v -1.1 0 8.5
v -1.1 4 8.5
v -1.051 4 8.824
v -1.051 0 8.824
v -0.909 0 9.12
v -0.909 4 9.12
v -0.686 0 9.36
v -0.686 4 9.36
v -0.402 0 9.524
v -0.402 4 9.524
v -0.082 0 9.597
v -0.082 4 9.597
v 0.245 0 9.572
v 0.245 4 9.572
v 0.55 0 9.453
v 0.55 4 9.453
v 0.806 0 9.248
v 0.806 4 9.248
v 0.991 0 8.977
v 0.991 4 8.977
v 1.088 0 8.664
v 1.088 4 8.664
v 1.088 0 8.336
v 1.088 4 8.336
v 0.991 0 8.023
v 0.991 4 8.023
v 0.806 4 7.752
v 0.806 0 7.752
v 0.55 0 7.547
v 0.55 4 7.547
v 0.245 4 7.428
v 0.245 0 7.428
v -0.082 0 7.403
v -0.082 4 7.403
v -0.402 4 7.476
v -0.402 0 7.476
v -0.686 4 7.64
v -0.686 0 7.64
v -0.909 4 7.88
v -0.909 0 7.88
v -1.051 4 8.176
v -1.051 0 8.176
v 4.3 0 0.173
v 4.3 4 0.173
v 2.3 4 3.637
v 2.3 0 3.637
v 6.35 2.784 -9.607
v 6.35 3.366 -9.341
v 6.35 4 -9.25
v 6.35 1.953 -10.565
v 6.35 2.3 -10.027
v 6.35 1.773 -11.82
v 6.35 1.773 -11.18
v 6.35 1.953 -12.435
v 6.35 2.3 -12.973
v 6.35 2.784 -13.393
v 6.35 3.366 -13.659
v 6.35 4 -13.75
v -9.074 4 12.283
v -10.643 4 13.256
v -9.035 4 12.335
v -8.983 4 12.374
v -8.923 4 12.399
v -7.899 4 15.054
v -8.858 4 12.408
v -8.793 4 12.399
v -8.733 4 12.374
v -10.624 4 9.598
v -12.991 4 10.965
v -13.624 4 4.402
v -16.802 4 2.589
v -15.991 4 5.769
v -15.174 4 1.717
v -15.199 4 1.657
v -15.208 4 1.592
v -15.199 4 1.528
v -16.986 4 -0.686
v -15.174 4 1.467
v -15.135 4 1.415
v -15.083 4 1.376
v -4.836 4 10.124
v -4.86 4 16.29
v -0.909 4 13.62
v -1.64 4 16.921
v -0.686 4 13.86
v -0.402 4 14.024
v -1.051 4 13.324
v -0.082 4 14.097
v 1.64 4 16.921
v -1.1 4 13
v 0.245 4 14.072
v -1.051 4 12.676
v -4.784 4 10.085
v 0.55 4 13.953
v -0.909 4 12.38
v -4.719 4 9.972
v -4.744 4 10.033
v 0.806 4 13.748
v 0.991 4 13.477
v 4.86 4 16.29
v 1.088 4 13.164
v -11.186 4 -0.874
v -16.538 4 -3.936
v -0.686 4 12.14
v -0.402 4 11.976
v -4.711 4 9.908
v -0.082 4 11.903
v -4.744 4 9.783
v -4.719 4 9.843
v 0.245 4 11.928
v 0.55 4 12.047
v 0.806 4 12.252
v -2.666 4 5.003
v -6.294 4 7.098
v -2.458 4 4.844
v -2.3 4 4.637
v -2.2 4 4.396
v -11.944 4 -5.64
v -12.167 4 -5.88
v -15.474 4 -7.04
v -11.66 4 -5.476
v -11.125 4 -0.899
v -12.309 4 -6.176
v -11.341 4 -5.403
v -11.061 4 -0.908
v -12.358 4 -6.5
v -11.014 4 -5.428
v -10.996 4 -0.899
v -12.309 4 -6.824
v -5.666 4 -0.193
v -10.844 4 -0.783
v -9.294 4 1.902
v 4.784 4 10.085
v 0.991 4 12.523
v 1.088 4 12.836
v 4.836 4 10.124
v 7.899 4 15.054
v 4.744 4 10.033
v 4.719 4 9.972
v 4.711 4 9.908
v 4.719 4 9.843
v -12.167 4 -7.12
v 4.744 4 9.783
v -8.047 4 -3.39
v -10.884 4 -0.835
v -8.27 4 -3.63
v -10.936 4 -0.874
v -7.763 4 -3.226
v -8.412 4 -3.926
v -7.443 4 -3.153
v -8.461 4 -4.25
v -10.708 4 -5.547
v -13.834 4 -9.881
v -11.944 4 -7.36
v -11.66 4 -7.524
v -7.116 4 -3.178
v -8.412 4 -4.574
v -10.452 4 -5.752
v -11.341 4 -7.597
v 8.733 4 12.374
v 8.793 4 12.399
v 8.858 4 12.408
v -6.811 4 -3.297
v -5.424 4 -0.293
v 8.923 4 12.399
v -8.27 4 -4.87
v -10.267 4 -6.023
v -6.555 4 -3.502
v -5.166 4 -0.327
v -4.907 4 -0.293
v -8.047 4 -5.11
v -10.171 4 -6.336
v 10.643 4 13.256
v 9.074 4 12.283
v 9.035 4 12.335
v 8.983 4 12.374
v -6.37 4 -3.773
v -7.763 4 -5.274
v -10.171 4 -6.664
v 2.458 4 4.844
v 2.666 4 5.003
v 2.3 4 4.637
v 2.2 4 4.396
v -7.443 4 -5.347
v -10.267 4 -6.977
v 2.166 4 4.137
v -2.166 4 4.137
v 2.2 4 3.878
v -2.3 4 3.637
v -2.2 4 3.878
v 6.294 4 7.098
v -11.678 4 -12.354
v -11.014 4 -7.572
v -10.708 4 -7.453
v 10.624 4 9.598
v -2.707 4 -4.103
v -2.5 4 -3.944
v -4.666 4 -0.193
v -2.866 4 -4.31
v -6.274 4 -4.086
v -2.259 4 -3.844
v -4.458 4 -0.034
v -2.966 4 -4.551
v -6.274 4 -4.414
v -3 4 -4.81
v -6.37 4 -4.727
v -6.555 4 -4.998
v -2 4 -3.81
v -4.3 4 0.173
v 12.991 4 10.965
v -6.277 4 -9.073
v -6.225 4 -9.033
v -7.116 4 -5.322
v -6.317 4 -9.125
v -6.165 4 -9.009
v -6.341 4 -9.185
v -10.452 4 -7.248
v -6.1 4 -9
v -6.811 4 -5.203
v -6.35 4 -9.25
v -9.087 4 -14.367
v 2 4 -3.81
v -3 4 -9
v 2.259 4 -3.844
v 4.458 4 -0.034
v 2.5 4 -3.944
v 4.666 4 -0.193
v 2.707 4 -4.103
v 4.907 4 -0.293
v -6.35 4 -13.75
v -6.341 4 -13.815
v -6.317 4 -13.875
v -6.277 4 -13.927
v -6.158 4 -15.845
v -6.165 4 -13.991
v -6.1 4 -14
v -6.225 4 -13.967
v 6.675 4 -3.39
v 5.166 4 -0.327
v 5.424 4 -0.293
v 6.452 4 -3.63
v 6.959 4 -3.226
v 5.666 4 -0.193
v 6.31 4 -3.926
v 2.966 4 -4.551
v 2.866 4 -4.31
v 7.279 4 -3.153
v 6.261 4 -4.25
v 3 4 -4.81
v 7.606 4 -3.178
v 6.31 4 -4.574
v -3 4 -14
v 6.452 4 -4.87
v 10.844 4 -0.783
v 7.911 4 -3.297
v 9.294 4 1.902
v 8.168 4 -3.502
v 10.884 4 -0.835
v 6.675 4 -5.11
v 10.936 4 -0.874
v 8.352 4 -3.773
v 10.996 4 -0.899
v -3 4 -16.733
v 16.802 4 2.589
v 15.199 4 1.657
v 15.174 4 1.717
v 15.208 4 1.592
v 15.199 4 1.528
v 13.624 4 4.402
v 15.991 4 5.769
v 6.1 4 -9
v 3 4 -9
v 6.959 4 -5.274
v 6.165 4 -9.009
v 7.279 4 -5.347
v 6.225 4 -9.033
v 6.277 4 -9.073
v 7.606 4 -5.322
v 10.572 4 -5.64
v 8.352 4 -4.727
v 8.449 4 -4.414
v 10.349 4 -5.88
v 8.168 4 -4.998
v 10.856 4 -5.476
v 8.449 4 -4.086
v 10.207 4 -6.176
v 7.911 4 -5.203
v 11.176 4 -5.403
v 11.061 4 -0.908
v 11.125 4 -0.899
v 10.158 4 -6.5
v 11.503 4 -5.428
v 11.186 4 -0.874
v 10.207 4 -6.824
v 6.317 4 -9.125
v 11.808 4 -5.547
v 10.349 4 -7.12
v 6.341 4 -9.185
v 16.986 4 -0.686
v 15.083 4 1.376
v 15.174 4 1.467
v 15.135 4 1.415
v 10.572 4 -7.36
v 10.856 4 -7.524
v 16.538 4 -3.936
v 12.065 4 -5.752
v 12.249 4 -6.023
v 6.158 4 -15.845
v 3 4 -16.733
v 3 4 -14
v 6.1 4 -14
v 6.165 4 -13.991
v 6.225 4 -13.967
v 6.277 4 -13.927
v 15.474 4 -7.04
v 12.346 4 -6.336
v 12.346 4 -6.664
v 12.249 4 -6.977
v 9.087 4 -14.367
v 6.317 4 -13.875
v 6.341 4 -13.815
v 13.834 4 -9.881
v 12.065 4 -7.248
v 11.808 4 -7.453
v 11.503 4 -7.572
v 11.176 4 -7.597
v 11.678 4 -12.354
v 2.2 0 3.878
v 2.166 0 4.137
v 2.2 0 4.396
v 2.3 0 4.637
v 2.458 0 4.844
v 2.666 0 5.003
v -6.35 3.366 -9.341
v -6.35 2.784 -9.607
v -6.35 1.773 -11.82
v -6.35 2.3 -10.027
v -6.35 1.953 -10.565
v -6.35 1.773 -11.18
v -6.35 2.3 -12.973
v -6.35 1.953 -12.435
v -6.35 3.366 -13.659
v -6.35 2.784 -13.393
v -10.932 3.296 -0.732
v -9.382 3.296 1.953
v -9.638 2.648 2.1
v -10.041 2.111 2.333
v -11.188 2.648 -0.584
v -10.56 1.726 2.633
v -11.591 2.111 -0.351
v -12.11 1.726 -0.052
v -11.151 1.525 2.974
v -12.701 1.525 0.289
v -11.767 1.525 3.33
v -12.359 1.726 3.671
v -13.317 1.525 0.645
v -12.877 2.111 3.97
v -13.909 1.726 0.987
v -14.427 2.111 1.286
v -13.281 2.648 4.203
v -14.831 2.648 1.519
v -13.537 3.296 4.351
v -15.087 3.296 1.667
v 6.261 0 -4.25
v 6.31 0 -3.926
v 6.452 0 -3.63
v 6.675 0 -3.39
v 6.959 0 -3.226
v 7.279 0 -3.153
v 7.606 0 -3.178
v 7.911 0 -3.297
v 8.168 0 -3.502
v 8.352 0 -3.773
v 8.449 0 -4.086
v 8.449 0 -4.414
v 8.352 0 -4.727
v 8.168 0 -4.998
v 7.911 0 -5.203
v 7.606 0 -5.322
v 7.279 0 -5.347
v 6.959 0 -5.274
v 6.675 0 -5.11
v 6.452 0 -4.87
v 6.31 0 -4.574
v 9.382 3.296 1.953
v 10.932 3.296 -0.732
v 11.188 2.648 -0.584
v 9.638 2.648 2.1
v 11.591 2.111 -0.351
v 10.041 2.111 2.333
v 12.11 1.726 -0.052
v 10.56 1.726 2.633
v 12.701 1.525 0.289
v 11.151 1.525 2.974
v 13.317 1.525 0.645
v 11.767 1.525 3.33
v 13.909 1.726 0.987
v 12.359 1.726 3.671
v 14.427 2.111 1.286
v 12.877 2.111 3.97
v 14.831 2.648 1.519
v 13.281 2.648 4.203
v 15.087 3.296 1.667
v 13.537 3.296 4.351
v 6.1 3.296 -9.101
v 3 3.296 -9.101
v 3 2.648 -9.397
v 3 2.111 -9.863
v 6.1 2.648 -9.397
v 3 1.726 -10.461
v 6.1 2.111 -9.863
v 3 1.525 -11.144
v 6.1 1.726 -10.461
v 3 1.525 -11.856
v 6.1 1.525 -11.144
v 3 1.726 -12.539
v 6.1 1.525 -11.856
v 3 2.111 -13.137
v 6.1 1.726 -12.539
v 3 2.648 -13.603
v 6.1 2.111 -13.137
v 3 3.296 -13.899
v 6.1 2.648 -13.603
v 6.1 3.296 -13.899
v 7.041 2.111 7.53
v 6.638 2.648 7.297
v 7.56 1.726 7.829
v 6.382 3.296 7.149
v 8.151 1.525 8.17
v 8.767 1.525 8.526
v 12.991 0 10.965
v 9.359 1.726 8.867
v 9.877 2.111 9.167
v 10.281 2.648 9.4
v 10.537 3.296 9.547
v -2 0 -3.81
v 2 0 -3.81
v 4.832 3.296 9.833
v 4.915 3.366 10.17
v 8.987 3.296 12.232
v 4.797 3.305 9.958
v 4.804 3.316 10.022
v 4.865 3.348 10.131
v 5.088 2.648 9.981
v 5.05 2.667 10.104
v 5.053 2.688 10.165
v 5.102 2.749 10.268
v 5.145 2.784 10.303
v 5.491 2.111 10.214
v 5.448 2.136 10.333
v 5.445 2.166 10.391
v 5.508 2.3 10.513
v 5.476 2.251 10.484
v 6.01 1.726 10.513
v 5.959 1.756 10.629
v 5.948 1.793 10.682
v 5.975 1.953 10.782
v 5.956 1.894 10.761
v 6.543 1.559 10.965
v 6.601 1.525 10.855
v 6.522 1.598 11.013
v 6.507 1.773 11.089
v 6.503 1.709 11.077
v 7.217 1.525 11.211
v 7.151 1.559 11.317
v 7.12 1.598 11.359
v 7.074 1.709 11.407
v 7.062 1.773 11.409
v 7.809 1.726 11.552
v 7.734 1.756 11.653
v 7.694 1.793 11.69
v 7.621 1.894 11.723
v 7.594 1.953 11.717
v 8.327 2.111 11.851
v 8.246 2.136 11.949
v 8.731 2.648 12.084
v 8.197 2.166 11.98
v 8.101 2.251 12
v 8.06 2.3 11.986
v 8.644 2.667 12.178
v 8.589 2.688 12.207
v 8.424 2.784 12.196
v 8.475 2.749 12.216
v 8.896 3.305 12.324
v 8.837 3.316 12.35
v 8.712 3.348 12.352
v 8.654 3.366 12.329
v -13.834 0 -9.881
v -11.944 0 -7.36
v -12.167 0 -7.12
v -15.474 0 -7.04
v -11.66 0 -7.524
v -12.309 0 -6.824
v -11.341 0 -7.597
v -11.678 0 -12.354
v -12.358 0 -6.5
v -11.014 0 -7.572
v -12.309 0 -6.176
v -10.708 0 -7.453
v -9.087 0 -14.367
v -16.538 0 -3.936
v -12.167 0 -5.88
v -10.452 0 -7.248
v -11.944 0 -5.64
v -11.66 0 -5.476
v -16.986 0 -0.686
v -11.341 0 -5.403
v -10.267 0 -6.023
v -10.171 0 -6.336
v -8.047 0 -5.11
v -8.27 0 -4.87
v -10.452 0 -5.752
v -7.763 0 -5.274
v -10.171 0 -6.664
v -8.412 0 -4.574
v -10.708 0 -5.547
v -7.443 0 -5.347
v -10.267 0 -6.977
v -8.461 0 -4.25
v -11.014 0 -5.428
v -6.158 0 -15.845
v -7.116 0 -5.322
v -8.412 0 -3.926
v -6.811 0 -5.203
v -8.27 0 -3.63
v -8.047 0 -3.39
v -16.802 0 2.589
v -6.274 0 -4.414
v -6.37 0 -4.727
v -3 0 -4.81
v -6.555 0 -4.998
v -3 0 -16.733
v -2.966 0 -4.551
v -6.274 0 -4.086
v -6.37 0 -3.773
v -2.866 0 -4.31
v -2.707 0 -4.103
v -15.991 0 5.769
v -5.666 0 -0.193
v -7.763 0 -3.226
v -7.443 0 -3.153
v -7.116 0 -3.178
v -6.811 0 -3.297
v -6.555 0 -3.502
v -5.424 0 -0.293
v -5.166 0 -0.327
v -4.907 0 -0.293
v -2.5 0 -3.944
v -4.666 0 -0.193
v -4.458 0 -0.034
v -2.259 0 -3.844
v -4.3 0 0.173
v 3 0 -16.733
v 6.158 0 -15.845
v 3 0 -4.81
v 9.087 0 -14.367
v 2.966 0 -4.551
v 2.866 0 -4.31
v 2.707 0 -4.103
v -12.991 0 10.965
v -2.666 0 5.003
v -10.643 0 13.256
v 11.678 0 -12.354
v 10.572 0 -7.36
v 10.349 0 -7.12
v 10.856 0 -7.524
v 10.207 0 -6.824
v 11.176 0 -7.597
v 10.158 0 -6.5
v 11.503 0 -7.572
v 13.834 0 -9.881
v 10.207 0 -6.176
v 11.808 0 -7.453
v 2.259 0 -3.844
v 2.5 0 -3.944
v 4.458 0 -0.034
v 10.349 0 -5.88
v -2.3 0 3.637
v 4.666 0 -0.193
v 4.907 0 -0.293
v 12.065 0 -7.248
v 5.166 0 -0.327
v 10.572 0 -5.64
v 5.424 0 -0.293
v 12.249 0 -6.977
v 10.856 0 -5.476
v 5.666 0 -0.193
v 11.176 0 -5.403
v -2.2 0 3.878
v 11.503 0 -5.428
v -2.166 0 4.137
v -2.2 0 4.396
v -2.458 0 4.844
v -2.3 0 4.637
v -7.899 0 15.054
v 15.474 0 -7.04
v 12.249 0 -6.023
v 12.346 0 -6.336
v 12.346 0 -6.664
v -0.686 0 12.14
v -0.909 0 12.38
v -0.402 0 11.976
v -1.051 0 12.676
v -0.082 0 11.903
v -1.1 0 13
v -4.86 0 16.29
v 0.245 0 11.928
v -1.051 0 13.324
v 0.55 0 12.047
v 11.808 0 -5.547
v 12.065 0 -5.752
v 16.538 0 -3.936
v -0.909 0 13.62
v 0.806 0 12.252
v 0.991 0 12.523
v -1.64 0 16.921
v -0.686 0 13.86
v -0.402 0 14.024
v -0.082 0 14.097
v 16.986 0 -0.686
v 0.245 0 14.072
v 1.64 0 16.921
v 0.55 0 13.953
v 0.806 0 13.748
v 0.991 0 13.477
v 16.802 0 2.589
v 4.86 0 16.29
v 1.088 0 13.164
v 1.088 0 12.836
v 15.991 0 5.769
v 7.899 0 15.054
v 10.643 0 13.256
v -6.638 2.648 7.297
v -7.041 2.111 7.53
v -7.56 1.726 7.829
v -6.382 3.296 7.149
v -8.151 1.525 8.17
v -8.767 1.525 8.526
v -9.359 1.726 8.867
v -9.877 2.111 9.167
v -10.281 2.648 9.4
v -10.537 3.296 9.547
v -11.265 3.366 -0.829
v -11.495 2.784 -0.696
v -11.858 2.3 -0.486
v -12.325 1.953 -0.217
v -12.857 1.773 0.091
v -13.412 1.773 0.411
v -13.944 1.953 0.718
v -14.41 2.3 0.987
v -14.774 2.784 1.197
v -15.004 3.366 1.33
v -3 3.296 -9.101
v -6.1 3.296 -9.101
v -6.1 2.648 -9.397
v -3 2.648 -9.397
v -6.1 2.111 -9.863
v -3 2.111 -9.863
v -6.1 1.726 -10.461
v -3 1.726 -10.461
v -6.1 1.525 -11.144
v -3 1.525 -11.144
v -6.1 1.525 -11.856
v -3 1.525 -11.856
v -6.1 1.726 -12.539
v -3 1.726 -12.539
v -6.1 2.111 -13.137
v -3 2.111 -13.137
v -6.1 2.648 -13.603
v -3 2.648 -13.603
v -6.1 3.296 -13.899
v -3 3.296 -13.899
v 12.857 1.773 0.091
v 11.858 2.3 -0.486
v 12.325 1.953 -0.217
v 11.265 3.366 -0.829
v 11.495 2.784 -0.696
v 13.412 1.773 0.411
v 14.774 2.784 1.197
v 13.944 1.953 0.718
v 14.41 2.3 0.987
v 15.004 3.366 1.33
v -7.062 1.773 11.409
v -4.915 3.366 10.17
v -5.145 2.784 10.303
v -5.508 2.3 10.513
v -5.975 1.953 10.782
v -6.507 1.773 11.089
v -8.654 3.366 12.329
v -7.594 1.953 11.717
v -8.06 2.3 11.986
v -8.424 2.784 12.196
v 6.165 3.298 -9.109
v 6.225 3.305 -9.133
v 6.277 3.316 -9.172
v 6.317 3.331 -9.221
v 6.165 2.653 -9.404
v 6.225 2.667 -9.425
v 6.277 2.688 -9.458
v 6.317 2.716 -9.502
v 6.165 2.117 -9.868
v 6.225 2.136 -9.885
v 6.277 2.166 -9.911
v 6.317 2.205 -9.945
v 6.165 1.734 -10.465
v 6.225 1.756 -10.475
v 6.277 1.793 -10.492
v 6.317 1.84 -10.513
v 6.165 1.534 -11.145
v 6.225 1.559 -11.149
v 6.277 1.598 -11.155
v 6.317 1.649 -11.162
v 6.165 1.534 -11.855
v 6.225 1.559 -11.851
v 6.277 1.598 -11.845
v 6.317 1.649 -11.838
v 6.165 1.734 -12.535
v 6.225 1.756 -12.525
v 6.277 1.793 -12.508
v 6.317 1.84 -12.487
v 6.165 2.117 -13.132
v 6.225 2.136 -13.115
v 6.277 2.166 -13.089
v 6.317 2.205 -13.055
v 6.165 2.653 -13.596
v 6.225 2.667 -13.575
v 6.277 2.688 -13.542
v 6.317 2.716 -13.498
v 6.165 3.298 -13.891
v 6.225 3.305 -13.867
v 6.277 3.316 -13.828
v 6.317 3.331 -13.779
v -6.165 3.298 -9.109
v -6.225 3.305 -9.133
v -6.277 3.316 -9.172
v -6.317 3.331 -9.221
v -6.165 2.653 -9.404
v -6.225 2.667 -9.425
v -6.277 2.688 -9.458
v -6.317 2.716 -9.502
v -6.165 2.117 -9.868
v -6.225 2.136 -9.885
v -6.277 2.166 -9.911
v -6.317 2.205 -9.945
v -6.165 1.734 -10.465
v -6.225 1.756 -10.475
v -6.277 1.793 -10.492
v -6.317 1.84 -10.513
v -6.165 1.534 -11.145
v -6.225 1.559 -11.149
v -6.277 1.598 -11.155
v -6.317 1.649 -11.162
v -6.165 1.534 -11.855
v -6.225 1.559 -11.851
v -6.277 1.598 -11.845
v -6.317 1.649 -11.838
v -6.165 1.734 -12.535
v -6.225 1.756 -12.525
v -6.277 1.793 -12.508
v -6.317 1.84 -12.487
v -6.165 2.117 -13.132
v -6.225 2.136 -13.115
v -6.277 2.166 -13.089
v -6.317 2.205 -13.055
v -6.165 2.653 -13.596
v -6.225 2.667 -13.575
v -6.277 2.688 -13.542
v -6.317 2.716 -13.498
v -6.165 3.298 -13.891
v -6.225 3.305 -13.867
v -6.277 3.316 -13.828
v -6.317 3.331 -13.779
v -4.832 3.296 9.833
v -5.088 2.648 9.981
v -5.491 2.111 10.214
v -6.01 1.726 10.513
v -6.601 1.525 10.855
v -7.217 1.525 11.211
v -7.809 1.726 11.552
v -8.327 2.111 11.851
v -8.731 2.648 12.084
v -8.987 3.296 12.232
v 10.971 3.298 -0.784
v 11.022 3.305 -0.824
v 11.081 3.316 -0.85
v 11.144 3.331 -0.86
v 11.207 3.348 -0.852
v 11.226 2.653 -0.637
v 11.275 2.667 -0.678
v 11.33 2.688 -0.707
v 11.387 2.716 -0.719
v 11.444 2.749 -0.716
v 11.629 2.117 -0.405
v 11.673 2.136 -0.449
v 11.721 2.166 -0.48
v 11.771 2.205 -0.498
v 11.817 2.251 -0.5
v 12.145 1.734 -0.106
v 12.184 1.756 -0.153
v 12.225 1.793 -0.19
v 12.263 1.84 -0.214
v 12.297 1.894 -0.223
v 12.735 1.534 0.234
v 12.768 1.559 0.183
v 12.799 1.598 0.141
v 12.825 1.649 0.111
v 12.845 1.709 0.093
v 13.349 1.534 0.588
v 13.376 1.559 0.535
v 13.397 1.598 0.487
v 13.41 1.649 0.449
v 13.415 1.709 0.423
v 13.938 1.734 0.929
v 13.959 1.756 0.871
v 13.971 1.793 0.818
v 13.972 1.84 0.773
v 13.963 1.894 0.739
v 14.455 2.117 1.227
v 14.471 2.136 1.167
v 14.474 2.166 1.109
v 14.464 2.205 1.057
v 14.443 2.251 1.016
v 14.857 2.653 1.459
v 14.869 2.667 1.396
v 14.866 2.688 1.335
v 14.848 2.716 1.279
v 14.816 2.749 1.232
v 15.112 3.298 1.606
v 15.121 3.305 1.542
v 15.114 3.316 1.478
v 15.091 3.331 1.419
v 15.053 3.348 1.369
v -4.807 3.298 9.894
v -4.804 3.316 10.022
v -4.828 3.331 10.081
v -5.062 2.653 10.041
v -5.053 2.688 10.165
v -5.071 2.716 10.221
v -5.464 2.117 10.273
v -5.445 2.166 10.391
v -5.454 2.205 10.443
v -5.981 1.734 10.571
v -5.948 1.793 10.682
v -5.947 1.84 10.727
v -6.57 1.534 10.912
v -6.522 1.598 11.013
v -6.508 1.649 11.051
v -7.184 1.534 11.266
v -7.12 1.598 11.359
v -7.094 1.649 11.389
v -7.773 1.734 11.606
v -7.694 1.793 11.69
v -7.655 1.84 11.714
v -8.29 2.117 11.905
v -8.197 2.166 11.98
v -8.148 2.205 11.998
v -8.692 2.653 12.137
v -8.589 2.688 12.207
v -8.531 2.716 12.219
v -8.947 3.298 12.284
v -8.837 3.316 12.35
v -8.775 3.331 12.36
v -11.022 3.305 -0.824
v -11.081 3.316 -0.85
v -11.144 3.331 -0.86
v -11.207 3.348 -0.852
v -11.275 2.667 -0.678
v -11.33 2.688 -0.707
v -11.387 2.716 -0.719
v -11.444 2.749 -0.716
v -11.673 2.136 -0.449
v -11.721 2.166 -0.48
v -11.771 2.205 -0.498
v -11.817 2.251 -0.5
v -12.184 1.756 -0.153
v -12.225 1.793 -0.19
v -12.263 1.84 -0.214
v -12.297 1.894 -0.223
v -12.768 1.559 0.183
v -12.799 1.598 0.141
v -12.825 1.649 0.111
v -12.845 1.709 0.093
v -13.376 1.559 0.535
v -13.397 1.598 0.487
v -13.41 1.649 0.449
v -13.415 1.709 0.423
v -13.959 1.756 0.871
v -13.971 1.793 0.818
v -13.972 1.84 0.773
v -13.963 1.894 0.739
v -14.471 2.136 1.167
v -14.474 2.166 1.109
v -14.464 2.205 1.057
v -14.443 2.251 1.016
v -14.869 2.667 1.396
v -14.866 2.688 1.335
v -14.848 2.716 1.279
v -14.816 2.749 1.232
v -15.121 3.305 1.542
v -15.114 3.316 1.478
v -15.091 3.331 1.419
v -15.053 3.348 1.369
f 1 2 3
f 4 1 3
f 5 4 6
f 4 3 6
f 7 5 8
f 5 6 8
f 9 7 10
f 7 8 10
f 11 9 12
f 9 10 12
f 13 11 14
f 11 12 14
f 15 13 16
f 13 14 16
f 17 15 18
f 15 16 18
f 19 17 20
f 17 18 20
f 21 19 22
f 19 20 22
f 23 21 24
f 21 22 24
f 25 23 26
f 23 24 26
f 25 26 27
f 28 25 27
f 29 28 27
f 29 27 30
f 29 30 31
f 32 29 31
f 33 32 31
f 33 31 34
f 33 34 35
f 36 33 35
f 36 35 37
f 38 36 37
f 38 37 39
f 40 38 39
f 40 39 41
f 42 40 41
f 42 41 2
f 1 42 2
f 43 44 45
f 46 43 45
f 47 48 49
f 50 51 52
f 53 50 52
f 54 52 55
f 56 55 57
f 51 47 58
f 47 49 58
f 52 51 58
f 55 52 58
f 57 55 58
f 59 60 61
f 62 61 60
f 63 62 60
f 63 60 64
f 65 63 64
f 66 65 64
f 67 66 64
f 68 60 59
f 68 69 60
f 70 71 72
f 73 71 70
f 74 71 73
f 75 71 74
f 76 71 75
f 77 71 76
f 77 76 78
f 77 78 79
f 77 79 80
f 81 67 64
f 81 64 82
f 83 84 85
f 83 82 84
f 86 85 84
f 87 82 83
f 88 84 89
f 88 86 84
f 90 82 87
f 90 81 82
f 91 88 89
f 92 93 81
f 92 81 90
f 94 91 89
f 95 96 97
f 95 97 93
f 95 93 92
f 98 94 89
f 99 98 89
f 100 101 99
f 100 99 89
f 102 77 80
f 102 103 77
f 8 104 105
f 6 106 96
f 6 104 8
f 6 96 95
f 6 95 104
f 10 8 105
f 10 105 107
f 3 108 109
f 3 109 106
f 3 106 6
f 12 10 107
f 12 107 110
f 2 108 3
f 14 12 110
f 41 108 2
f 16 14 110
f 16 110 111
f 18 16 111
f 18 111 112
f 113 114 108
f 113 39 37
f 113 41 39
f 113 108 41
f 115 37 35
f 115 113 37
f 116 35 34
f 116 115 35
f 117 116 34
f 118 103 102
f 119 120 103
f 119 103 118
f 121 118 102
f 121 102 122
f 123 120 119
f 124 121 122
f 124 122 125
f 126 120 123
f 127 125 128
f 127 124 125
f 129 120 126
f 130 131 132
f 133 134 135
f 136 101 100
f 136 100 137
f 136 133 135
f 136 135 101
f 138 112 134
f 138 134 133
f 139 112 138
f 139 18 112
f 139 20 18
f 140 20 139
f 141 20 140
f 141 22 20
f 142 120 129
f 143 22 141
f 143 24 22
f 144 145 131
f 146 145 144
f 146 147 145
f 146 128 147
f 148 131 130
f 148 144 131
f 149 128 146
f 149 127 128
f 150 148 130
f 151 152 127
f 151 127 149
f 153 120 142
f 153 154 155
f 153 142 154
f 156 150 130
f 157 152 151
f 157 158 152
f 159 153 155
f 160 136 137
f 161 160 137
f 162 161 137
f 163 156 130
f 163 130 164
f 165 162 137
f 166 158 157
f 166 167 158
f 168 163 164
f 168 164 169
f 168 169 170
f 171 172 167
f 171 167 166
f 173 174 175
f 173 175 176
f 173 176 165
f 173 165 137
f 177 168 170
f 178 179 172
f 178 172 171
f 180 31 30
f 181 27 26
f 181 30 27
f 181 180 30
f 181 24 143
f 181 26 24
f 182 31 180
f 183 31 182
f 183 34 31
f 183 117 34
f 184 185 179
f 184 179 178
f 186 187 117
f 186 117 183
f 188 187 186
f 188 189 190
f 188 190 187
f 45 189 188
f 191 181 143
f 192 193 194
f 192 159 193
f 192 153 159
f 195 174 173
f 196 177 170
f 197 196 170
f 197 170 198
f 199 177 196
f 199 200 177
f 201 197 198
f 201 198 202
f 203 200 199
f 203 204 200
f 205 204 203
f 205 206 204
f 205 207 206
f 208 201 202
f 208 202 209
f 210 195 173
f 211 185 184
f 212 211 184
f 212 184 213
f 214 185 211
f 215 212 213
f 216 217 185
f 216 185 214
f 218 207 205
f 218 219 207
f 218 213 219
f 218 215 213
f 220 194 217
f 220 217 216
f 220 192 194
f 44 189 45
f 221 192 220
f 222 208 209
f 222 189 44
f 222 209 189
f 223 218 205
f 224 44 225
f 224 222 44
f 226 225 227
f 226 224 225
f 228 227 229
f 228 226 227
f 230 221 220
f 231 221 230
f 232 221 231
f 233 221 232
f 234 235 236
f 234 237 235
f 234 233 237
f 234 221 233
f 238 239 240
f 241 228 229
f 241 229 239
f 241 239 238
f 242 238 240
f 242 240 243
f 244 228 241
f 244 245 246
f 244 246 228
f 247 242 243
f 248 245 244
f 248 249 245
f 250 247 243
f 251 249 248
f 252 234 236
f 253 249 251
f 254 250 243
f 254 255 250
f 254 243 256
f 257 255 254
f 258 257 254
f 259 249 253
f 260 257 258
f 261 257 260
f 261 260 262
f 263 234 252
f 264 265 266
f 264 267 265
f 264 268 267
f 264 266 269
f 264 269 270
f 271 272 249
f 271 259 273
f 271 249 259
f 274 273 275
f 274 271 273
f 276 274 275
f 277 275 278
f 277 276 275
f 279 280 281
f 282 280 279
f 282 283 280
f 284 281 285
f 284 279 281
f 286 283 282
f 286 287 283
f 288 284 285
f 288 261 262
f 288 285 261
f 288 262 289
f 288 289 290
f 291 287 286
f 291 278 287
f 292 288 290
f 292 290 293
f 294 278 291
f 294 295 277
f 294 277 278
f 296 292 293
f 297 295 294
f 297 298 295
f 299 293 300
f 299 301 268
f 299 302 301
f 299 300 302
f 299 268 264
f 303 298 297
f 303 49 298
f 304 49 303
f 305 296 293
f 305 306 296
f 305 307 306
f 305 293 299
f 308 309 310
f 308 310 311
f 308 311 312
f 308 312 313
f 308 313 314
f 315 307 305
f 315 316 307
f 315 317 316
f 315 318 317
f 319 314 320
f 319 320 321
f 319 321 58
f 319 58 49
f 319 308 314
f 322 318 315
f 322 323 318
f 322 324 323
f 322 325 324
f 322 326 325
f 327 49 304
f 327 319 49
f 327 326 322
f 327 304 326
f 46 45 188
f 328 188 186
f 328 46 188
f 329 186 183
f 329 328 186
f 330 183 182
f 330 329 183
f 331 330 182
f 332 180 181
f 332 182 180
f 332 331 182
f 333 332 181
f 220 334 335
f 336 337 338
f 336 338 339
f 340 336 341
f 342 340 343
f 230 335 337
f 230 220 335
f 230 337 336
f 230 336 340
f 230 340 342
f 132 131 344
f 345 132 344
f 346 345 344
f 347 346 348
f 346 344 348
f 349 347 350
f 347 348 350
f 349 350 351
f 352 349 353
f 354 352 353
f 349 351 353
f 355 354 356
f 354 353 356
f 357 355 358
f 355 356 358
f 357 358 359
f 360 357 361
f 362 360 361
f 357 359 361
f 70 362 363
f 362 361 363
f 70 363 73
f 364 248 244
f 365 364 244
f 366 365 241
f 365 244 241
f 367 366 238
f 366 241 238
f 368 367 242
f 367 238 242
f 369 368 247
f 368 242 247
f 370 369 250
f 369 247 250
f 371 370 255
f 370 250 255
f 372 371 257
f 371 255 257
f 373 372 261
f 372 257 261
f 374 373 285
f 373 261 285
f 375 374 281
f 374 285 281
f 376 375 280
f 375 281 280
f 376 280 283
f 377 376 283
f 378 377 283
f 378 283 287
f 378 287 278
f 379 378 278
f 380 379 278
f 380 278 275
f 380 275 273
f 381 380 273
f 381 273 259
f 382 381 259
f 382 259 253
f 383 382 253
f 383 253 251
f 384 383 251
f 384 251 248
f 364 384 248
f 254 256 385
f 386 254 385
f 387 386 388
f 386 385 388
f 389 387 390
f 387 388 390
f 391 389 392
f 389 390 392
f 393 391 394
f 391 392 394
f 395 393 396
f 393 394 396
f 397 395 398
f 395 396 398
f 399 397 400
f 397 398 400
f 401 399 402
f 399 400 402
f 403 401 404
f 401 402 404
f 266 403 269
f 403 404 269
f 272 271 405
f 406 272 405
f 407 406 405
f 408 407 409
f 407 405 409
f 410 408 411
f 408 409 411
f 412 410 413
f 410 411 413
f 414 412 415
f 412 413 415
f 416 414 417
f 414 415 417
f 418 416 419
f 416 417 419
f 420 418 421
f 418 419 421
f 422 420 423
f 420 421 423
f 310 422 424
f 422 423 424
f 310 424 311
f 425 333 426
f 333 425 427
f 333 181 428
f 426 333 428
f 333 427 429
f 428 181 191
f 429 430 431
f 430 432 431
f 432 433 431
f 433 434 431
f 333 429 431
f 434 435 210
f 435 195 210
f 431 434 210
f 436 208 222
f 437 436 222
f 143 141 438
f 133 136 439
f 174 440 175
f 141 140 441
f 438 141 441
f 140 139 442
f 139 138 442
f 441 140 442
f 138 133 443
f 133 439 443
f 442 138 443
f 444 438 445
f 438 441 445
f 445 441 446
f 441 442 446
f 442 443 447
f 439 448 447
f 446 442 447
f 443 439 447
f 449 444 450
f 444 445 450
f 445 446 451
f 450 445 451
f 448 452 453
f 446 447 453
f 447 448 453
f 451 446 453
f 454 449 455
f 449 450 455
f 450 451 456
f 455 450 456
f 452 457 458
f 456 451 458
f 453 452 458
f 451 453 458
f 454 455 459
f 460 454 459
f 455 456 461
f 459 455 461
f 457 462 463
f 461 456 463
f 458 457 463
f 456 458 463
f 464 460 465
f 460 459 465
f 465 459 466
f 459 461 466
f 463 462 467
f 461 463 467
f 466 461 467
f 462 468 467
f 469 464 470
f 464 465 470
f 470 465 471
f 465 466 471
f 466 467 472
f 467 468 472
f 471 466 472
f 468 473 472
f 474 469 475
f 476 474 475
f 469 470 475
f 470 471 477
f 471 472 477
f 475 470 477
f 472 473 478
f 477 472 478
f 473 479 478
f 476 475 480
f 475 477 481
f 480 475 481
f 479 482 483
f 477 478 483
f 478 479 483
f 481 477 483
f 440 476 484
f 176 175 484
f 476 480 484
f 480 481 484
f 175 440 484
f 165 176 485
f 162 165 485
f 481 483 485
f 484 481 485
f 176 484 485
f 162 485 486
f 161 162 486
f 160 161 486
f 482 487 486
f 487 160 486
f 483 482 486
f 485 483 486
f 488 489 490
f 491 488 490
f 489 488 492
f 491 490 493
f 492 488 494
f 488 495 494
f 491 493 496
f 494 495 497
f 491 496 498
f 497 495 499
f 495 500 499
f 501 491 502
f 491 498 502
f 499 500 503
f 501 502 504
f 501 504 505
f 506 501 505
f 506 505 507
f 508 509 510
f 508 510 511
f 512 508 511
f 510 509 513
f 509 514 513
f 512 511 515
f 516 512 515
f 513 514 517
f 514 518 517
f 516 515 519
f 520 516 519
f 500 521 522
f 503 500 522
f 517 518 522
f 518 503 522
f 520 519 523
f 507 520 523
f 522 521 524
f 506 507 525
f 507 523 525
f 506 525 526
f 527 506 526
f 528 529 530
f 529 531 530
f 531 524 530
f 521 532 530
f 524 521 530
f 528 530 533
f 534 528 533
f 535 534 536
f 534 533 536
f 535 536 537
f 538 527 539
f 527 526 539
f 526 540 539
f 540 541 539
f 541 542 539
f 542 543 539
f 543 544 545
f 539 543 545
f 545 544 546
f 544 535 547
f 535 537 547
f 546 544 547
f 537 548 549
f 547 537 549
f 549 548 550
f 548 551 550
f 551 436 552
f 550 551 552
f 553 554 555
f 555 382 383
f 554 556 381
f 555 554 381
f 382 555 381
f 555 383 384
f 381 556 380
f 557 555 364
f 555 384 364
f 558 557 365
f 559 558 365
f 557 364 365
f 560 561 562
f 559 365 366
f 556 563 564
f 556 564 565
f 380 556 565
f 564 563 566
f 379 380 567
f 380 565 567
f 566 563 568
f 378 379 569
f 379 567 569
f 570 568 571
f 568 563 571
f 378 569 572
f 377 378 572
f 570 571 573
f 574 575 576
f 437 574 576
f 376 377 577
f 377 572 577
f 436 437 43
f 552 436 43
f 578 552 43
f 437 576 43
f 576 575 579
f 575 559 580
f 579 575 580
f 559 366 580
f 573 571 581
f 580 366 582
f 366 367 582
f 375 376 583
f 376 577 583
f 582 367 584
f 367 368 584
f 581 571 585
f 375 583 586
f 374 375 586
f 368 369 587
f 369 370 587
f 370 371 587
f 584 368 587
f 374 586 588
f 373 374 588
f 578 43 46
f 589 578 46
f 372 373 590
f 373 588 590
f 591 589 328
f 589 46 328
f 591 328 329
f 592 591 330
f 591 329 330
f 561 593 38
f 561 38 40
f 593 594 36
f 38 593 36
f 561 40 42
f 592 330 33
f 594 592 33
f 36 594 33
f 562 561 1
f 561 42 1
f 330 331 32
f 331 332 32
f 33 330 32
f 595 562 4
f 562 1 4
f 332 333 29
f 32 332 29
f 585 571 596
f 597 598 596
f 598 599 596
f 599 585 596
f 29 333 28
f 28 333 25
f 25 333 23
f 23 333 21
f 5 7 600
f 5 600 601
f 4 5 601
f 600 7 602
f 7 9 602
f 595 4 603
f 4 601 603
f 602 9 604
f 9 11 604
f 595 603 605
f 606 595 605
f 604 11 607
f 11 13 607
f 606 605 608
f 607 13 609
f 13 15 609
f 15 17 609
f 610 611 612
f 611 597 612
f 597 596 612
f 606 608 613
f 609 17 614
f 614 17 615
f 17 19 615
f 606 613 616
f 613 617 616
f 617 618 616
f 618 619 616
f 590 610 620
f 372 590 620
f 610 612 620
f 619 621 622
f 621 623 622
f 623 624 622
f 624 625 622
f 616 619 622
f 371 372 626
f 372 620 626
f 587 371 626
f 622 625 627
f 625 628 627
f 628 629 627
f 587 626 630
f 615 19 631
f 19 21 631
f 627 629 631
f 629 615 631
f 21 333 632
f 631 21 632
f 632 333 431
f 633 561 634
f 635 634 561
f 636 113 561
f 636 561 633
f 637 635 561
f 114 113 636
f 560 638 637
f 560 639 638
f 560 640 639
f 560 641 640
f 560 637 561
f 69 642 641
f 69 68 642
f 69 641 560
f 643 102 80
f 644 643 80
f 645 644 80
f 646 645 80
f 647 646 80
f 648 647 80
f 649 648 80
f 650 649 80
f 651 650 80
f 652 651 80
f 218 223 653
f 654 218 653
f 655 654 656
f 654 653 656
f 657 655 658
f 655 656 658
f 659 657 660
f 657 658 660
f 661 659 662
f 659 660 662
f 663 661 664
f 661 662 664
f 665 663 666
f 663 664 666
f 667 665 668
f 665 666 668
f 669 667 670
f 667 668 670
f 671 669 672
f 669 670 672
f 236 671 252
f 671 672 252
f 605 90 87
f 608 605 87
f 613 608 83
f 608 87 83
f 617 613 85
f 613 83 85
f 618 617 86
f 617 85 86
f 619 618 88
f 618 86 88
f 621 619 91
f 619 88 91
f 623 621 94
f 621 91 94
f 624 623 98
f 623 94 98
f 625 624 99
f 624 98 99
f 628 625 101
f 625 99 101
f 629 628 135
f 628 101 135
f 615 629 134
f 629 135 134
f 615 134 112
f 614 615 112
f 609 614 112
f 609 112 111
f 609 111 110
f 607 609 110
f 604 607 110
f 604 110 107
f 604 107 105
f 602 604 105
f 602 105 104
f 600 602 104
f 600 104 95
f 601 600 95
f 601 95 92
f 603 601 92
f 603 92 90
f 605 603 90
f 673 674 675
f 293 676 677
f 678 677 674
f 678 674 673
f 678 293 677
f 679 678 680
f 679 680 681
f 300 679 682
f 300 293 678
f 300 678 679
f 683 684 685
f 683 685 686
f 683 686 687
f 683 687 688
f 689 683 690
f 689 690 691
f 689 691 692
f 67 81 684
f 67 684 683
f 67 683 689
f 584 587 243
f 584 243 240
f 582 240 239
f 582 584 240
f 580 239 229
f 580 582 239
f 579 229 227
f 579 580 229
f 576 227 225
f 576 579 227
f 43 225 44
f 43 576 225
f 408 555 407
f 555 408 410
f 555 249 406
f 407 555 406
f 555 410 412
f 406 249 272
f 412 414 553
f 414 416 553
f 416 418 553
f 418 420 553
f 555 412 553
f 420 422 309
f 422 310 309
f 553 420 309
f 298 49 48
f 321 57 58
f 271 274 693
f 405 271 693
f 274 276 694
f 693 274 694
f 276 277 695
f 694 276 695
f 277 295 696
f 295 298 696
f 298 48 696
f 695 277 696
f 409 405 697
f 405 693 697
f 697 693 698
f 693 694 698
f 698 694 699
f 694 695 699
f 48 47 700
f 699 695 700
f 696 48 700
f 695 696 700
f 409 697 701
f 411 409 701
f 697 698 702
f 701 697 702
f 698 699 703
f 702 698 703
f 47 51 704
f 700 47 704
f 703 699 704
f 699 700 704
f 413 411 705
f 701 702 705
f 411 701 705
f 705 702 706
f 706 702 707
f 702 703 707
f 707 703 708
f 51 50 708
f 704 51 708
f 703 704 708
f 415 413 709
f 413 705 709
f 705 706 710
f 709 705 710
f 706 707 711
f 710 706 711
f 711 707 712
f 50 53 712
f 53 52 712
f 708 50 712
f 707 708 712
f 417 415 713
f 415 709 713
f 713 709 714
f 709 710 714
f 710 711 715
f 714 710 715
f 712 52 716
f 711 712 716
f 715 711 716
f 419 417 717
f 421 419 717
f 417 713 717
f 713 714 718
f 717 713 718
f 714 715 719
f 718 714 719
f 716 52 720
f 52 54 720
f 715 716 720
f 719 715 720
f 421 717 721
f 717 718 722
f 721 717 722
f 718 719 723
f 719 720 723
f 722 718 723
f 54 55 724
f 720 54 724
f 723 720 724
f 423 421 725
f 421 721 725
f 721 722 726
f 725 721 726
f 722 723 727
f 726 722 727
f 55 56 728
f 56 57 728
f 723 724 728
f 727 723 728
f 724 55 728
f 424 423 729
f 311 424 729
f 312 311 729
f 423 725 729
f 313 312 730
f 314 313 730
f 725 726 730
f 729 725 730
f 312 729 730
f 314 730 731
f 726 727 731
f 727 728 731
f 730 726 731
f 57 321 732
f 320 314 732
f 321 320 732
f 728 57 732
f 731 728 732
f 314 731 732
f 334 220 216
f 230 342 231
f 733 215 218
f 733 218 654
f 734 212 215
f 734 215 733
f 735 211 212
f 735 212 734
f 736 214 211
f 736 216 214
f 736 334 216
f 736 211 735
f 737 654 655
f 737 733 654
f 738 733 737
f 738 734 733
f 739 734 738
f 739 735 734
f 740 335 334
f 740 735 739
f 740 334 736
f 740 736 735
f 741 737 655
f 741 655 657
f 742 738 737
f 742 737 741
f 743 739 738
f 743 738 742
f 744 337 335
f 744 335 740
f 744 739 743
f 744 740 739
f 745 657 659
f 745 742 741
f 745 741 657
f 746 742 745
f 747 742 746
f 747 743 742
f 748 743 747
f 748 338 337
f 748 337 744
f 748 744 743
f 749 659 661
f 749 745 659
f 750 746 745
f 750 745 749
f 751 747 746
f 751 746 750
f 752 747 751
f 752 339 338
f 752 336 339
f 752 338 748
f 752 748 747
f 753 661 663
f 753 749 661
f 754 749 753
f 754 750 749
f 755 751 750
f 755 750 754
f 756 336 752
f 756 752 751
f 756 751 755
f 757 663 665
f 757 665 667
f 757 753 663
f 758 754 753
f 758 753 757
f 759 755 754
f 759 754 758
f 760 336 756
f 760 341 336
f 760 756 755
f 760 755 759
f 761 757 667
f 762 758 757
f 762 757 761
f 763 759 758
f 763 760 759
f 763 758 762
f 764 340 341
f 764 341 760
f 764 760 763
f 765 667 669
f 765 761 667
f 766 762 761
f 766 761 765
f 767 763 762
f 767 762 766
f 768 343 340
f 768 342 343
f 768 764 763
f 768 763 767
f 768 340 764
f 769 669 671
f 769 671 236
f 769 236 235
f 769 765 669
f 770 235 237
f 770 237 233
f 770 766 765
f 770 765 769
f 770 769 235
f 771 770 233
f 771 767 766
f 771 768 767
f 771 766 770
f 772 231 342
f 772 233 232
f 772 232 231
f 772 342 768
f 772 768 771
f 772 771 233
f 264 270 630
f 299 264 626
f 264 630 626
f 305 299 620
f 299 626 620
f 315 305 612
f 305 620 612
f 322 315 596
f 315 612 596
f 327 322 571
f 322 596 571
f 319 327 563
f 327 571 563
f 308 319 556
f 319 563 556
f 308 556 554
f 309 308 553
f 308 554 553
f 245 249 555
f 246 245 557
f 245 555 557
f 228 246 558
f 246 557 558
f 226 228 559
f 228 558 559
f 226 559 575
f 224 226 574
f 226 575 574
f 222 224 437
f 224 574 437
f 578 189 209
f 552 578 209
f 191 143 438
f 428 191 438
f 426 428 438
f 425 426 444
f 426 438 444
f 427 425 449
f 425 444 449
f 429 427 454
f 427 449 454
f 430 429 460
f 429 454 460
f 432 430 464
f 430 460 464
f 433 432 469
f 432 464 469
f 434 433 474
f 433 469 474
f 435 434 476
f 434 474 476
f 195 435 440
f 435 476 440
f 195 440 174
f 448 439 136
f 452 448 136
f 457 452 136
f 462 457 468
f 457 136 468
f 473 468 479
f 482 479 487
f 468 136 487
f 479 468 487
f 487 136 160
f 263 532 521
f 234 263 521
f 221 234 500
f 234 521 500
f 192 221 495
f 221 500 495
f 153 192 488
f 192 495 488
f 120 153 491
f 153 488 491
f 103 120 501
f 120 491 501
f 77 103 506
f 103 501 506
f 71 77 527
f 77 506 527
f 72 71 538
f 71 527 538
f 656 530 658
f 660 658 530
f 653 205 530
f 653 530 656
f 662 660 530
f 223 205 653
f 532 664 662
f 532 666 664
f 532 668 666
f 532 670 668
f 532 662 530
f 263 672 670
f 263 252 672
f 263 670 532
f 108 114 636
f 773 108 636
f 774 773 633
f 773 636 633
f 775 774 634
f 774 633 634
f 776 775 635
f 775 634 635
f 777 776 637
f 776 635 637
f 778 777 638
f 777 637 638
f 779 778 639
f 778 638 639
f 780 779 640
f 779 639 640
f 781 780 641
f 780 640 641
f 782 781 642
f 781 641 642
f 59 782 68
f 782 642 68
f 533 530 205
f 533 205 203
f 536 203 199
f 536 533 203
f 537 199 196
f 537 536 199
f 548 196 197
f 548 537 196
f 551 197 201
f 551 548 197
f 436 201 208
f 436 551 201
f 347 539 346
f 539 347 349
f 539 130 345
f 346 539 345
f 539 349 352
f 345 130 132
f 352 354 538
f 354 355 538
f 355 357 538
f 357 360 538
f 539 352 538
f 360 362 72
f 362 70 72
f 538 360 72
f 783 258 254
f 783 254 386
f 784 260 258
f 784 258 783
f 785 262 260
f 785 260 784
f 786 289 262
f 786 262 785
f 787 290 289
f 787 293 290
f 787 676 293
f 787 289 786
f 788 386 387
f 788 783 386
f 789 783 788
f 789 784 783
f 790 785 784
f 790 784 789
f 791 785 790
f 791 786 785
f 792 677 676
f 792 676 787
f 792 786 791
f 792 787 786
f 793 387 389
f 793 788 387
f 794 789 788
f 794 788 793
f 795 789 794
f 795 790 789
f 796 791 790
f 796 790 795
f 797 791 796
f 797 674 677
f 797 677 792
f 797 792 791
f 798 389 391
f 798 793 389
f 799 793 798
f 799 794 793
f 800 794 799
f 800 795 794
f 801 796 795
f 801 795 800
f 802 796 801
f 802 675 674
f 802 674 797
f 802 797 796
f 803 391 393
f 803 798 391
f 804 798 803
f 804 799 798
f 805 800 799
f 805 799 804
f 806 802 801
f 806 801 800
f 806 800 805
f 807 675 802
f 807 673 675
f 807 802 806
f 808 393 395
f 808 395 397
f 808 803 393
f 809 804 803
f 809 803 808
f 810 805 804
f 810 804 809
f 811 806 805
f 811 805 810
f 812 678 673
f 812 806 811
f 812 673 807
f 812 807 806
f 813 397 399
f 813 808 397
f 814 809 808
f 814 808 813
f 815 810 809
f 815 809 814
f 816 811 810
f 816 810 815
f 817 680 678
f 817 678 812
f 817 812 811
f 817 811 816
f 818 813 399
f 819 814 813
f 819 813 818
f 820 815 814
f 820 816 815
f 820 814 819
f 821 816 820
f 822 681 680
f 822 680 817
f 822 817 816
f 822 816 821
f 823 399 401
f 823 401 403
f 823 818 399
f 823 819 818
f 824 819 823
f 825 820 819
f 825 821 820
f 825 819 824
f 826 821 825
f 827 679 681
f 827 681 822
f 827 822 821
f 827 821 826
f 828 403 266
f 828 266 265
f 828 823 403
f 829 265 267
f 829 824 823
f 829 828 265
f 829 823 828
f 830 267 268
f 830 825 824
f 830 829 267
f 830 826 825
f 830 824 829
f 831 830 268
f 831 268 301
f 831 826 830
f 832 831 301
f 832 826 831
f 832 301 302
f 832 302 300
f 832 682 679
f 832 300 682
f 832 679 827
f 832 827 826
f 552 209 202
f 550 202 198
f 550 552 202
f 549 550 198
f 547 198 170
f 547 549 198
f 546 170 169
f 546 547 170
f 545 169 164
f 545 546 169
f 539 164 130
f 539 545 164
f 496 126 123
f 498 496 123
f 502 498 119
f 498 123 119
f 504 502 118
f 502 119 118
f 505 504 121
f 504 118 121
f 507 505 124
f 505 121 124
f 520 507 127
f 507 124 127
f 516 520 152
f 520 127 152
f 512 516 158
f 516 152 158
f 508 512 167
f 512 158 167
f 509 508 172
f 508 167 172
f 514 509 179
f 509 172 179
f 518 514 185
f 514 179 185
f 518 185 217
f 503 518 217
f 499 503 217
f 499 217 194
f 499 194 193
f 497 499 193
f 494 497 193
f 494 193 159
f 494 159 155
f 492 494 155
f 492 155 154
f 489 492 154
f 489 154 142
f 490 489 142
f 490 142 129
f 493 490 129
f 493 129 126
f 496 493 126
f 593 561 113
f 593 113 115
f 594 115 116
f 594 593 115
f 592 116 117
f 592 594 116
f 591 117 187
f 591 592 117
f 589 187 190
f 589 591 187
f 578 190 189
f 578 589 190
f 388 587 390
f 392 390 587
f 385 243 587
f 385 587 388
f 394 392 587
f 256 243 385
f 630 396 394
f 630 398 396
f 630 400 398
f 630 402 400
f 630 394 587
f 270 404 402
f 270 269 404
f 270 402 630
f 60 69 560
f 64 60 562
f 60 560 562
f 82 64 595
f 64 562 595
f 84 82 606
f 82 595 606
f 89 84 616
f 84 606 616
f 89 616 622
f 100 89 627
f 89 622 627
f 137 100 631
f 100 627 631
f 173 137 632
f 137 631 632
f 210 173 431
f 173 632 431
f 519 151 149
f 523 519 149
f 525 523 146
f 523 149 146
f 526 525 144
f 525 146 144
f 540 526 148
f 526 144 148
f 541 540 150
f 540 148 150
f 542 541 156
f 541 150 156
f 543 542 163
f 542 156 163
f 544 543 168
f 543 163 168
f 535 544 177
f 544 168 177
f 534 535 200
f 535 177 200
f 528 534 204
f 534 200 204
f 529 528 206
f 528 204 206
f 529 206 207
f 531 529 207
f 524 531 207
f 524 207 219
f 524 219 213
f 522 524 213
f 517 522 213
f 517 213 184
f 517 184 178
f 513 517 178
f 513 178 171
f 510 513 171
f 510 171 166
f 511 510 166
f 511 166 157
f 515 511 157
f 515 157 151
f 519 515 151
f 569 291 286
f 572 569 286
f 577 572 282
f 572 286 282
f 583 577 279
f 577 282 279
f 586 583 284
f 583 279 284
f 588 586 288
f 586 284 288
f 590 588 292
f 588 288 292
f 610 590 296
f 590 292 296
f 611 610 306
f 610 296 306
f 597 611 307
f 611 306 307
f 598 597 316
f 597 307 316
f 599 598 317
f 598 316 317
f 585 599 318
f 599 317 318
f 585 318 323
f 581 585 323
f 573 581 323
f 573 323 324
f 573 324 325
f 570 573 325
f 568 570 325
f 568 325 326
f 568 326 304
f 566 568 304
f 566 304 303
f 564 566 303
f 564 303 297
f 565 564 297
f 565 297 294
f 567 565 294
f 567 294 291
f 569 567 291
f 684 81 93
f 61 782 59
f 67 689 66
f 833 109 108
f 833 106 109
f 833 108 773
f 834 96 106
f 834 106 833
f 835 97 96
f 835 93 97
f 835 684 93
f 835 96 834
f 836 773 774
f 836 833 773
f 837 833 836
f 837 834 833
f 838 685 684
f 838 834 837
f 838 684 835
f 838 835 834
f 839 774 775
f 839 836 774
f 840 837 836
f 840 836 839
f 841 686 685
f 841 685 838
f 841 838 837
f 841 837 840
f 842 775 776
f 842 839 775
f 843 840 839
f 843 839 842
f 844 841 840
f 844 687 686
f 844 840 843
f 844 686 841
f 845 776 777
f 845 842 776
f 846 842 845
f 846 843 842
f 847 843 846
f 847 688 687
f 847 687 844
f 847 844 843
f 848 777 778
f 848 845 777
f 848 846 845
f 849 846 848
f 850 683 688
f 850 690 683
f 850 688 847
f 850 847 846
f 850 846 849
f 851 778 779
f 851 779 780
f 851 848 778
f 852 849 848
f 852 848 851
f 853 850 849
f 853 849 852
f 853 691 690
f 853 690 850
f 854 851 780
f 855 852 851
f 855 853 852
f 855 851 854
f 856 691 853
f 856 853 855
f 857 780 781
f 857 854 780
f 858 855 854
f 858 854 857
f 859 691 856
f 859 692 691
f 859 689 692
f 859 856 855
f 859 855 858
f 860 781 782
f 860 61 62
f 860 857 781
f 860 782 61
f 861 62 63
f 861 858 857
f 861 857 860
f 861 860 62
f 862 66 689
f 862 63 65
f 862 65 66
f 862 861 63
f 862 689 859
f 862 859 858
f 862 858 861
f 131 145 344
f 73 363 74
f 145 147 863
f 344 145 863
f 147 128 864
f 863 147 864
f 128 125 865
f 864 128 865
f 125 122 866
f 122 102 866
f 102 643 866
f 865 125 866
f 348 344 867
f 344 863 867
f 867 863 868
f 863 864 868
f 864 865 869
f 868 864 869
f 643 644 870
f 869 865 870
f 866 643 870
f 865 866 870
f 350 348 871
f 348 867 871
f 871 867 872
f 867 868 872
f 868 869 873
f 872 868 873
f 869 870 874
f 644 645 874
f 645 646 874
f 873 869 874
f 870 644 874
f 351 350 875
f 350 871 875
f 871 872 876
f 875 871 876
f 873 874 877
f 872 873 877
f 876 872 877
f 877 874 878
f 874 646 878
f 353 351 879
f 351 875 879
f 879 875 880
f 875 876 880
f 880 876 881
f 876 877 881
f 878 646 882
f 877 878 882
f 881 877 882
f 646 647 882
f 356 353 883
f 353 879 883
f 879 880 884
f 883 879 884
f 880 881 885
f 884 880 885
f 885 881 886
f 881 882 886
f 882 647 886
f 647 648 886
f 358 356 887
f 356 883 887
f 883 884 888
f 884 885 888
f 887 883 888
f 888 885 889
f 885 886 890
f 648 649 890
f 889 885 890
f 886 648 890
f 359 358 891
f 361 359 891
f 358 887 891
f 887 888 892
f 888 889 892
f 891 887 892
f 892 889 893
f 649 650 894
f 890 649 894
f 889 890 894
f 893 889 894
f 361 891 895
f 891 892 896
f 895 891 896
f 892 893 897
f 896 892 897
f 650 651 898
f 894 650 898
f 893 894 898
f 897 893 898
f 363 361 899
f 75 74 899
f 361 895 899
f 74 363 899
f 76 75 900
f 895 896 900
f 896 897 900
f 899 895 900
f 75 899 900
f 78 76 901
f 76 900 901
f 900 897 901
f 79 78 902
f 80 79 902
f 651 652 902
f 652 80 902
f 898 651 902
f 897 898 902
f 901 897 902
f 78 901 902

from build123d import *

# Parameters (mm, degrees)
SKETCH1_R                  = 17
BOSS_EXTRUDE1_DEPTH        = 8
SKETCH9_W                  = 6
SKETCH9_H                  = 13.19
CUT_EXTRUDE1_DEPTH         = 26.337718919
SKETCH10_R                 = 2.5
CUT_EXTRUDE2_DEPTH         = 6.35
FILLET2_R                  = 1
CIRPATTERN2_COUNT          = 3
FILLET2_OF_CIRPATTERN2_R   = 1
SKETCH12_R                 = 20
CUT_EXTRUDE3_DEPTH         = 10
F_2_2_2_2_DIAMETER_HOLE1_D = 2.2
FILLET3_R                  = 0.25


with BuildPart() as part:
    # Sketch1 → Boss-Extrude1 (new body)
    with BuildSketch(Plane(origin=(0, 0, 0), x_dir=(1, 0, 0), z_dir=(0, 1, 0))):
        Circle(SKETCH1_R)
    extrude(amount=BOSS_EXTRUDE1_DEPTH)

    # Sketch9 → Cut-Extrude1 (cut, through all)
    with BuildSketch(Plane(origin=(0, 8, 0), x_dir=(1, 0, 0), z_dir=(0, 1, 0))):
        with Locations((0, 10.405)):
            Rectangle(SKETCH9_W, SKETCH9_H)
    cut_extrude1 = extrude(amount=-CUT_EXTRUDE1_DEPTH, mode=Mode.SUBTRACT)

    # Sketch10 → Cut-Extrude2 (cut, symmetric)
    with BuildSketch(Plane(origin=(0, 0, 0), x_dir=(0, 0, -1), z_dir=(1, 0, 0))):
        with Locations((11.5, 4)):
            Circle(SKETCH10_R)
    cut_extrude2 = extrude(amount=CUT_EXTRUDE2_DEPTH, both=True, mode=Mode.SUBTRACT)

    # Fillet2
    fillet2_edges = [part.edges().sort_by_distance(p)[0] for p in [
        (3, 4, -3.81),
        (-3, 4, -3.81),
    ]]
    fillet(fillet2_edges, radius=FILLET2_R)

    # CirPattern2: Cut-Extrude1, Cut-Extrude2 ×3 about axis
    cirpattern2_axis = Axis((0, 40.005, 0), (0, -1, 0))
    add([cut_extrude1.rotate(cirpattern2_axis, i * 360 / CIRPATTERN2_COUNT) for i in range(1, CIRPATTERN2_COUNT)], mode=Mode.SUBTRACT)
    add([cut_extrude2.rotate(cirpattern2_axis, i * 360 / CIRPATTERN2_COUNT) for i in range(1, CIRPATTERN2_COUNT)], mode=Mode.SUBTRACT)

    # Fillet2 of CirPattern2
    fillet2_of_cirpattern2_edges = [part.edges().sort_by_distance(p)[0] for p in [
        (1.799556788, 4, 4.503076211),
        (4.799556788, 4, -0.693076211),
        (-4.799556788, 4, -0.693076211),
        (-1.799556788, 4, 4.503076211),
    ]]
    fillet(fillet2_of_cirpattern2_edges, radius=FILLET2_OF_CIRPATTERN2_R)

    # Sketch12 → Cut-Extrude3 (cut)
    with BuildSketch(Plane(origin=(0, 4, 0), x_dir=(1, 0, 0), z_dir=(0, 1, 0))):
        Circle(SKETCH12_R)
    extrude(amount=CUT_EXTRUDE3_DEPTH, mode=Mode.SUBTRACT)

    # Ø2.2 (2.2) Diameter Hole1 (through all)
    with Locations(Plane.XZ):
        with Locations((-11.258330249, -6.5), (11.258330249, -6.5), (0, 13), (-7.361215932, -4.25), (7.361215932, -4.25), (0, 8.5)):
            Hole(F_2_2_2_2_DIAMETER_HOLE1_D / 2)

    # Fillet3
    fillet3_edges = [part.edges().sort_by_distance(p)[0] for p in [
        (-13.134292144, 1.5, 0.250738686),
        (-6.784292144, 1.5, 11.249261314),
        (6.784292144, 1.5, 11.249261314),
        (13.134292144, 1.5, 0.250738686),
        (-6.35, 1.5, -11.5),
        (6.35, 1.5, -11.5),
    ]]
    fillet(fillet3_edges, radius=FILLET3_R)


solid = part.part
